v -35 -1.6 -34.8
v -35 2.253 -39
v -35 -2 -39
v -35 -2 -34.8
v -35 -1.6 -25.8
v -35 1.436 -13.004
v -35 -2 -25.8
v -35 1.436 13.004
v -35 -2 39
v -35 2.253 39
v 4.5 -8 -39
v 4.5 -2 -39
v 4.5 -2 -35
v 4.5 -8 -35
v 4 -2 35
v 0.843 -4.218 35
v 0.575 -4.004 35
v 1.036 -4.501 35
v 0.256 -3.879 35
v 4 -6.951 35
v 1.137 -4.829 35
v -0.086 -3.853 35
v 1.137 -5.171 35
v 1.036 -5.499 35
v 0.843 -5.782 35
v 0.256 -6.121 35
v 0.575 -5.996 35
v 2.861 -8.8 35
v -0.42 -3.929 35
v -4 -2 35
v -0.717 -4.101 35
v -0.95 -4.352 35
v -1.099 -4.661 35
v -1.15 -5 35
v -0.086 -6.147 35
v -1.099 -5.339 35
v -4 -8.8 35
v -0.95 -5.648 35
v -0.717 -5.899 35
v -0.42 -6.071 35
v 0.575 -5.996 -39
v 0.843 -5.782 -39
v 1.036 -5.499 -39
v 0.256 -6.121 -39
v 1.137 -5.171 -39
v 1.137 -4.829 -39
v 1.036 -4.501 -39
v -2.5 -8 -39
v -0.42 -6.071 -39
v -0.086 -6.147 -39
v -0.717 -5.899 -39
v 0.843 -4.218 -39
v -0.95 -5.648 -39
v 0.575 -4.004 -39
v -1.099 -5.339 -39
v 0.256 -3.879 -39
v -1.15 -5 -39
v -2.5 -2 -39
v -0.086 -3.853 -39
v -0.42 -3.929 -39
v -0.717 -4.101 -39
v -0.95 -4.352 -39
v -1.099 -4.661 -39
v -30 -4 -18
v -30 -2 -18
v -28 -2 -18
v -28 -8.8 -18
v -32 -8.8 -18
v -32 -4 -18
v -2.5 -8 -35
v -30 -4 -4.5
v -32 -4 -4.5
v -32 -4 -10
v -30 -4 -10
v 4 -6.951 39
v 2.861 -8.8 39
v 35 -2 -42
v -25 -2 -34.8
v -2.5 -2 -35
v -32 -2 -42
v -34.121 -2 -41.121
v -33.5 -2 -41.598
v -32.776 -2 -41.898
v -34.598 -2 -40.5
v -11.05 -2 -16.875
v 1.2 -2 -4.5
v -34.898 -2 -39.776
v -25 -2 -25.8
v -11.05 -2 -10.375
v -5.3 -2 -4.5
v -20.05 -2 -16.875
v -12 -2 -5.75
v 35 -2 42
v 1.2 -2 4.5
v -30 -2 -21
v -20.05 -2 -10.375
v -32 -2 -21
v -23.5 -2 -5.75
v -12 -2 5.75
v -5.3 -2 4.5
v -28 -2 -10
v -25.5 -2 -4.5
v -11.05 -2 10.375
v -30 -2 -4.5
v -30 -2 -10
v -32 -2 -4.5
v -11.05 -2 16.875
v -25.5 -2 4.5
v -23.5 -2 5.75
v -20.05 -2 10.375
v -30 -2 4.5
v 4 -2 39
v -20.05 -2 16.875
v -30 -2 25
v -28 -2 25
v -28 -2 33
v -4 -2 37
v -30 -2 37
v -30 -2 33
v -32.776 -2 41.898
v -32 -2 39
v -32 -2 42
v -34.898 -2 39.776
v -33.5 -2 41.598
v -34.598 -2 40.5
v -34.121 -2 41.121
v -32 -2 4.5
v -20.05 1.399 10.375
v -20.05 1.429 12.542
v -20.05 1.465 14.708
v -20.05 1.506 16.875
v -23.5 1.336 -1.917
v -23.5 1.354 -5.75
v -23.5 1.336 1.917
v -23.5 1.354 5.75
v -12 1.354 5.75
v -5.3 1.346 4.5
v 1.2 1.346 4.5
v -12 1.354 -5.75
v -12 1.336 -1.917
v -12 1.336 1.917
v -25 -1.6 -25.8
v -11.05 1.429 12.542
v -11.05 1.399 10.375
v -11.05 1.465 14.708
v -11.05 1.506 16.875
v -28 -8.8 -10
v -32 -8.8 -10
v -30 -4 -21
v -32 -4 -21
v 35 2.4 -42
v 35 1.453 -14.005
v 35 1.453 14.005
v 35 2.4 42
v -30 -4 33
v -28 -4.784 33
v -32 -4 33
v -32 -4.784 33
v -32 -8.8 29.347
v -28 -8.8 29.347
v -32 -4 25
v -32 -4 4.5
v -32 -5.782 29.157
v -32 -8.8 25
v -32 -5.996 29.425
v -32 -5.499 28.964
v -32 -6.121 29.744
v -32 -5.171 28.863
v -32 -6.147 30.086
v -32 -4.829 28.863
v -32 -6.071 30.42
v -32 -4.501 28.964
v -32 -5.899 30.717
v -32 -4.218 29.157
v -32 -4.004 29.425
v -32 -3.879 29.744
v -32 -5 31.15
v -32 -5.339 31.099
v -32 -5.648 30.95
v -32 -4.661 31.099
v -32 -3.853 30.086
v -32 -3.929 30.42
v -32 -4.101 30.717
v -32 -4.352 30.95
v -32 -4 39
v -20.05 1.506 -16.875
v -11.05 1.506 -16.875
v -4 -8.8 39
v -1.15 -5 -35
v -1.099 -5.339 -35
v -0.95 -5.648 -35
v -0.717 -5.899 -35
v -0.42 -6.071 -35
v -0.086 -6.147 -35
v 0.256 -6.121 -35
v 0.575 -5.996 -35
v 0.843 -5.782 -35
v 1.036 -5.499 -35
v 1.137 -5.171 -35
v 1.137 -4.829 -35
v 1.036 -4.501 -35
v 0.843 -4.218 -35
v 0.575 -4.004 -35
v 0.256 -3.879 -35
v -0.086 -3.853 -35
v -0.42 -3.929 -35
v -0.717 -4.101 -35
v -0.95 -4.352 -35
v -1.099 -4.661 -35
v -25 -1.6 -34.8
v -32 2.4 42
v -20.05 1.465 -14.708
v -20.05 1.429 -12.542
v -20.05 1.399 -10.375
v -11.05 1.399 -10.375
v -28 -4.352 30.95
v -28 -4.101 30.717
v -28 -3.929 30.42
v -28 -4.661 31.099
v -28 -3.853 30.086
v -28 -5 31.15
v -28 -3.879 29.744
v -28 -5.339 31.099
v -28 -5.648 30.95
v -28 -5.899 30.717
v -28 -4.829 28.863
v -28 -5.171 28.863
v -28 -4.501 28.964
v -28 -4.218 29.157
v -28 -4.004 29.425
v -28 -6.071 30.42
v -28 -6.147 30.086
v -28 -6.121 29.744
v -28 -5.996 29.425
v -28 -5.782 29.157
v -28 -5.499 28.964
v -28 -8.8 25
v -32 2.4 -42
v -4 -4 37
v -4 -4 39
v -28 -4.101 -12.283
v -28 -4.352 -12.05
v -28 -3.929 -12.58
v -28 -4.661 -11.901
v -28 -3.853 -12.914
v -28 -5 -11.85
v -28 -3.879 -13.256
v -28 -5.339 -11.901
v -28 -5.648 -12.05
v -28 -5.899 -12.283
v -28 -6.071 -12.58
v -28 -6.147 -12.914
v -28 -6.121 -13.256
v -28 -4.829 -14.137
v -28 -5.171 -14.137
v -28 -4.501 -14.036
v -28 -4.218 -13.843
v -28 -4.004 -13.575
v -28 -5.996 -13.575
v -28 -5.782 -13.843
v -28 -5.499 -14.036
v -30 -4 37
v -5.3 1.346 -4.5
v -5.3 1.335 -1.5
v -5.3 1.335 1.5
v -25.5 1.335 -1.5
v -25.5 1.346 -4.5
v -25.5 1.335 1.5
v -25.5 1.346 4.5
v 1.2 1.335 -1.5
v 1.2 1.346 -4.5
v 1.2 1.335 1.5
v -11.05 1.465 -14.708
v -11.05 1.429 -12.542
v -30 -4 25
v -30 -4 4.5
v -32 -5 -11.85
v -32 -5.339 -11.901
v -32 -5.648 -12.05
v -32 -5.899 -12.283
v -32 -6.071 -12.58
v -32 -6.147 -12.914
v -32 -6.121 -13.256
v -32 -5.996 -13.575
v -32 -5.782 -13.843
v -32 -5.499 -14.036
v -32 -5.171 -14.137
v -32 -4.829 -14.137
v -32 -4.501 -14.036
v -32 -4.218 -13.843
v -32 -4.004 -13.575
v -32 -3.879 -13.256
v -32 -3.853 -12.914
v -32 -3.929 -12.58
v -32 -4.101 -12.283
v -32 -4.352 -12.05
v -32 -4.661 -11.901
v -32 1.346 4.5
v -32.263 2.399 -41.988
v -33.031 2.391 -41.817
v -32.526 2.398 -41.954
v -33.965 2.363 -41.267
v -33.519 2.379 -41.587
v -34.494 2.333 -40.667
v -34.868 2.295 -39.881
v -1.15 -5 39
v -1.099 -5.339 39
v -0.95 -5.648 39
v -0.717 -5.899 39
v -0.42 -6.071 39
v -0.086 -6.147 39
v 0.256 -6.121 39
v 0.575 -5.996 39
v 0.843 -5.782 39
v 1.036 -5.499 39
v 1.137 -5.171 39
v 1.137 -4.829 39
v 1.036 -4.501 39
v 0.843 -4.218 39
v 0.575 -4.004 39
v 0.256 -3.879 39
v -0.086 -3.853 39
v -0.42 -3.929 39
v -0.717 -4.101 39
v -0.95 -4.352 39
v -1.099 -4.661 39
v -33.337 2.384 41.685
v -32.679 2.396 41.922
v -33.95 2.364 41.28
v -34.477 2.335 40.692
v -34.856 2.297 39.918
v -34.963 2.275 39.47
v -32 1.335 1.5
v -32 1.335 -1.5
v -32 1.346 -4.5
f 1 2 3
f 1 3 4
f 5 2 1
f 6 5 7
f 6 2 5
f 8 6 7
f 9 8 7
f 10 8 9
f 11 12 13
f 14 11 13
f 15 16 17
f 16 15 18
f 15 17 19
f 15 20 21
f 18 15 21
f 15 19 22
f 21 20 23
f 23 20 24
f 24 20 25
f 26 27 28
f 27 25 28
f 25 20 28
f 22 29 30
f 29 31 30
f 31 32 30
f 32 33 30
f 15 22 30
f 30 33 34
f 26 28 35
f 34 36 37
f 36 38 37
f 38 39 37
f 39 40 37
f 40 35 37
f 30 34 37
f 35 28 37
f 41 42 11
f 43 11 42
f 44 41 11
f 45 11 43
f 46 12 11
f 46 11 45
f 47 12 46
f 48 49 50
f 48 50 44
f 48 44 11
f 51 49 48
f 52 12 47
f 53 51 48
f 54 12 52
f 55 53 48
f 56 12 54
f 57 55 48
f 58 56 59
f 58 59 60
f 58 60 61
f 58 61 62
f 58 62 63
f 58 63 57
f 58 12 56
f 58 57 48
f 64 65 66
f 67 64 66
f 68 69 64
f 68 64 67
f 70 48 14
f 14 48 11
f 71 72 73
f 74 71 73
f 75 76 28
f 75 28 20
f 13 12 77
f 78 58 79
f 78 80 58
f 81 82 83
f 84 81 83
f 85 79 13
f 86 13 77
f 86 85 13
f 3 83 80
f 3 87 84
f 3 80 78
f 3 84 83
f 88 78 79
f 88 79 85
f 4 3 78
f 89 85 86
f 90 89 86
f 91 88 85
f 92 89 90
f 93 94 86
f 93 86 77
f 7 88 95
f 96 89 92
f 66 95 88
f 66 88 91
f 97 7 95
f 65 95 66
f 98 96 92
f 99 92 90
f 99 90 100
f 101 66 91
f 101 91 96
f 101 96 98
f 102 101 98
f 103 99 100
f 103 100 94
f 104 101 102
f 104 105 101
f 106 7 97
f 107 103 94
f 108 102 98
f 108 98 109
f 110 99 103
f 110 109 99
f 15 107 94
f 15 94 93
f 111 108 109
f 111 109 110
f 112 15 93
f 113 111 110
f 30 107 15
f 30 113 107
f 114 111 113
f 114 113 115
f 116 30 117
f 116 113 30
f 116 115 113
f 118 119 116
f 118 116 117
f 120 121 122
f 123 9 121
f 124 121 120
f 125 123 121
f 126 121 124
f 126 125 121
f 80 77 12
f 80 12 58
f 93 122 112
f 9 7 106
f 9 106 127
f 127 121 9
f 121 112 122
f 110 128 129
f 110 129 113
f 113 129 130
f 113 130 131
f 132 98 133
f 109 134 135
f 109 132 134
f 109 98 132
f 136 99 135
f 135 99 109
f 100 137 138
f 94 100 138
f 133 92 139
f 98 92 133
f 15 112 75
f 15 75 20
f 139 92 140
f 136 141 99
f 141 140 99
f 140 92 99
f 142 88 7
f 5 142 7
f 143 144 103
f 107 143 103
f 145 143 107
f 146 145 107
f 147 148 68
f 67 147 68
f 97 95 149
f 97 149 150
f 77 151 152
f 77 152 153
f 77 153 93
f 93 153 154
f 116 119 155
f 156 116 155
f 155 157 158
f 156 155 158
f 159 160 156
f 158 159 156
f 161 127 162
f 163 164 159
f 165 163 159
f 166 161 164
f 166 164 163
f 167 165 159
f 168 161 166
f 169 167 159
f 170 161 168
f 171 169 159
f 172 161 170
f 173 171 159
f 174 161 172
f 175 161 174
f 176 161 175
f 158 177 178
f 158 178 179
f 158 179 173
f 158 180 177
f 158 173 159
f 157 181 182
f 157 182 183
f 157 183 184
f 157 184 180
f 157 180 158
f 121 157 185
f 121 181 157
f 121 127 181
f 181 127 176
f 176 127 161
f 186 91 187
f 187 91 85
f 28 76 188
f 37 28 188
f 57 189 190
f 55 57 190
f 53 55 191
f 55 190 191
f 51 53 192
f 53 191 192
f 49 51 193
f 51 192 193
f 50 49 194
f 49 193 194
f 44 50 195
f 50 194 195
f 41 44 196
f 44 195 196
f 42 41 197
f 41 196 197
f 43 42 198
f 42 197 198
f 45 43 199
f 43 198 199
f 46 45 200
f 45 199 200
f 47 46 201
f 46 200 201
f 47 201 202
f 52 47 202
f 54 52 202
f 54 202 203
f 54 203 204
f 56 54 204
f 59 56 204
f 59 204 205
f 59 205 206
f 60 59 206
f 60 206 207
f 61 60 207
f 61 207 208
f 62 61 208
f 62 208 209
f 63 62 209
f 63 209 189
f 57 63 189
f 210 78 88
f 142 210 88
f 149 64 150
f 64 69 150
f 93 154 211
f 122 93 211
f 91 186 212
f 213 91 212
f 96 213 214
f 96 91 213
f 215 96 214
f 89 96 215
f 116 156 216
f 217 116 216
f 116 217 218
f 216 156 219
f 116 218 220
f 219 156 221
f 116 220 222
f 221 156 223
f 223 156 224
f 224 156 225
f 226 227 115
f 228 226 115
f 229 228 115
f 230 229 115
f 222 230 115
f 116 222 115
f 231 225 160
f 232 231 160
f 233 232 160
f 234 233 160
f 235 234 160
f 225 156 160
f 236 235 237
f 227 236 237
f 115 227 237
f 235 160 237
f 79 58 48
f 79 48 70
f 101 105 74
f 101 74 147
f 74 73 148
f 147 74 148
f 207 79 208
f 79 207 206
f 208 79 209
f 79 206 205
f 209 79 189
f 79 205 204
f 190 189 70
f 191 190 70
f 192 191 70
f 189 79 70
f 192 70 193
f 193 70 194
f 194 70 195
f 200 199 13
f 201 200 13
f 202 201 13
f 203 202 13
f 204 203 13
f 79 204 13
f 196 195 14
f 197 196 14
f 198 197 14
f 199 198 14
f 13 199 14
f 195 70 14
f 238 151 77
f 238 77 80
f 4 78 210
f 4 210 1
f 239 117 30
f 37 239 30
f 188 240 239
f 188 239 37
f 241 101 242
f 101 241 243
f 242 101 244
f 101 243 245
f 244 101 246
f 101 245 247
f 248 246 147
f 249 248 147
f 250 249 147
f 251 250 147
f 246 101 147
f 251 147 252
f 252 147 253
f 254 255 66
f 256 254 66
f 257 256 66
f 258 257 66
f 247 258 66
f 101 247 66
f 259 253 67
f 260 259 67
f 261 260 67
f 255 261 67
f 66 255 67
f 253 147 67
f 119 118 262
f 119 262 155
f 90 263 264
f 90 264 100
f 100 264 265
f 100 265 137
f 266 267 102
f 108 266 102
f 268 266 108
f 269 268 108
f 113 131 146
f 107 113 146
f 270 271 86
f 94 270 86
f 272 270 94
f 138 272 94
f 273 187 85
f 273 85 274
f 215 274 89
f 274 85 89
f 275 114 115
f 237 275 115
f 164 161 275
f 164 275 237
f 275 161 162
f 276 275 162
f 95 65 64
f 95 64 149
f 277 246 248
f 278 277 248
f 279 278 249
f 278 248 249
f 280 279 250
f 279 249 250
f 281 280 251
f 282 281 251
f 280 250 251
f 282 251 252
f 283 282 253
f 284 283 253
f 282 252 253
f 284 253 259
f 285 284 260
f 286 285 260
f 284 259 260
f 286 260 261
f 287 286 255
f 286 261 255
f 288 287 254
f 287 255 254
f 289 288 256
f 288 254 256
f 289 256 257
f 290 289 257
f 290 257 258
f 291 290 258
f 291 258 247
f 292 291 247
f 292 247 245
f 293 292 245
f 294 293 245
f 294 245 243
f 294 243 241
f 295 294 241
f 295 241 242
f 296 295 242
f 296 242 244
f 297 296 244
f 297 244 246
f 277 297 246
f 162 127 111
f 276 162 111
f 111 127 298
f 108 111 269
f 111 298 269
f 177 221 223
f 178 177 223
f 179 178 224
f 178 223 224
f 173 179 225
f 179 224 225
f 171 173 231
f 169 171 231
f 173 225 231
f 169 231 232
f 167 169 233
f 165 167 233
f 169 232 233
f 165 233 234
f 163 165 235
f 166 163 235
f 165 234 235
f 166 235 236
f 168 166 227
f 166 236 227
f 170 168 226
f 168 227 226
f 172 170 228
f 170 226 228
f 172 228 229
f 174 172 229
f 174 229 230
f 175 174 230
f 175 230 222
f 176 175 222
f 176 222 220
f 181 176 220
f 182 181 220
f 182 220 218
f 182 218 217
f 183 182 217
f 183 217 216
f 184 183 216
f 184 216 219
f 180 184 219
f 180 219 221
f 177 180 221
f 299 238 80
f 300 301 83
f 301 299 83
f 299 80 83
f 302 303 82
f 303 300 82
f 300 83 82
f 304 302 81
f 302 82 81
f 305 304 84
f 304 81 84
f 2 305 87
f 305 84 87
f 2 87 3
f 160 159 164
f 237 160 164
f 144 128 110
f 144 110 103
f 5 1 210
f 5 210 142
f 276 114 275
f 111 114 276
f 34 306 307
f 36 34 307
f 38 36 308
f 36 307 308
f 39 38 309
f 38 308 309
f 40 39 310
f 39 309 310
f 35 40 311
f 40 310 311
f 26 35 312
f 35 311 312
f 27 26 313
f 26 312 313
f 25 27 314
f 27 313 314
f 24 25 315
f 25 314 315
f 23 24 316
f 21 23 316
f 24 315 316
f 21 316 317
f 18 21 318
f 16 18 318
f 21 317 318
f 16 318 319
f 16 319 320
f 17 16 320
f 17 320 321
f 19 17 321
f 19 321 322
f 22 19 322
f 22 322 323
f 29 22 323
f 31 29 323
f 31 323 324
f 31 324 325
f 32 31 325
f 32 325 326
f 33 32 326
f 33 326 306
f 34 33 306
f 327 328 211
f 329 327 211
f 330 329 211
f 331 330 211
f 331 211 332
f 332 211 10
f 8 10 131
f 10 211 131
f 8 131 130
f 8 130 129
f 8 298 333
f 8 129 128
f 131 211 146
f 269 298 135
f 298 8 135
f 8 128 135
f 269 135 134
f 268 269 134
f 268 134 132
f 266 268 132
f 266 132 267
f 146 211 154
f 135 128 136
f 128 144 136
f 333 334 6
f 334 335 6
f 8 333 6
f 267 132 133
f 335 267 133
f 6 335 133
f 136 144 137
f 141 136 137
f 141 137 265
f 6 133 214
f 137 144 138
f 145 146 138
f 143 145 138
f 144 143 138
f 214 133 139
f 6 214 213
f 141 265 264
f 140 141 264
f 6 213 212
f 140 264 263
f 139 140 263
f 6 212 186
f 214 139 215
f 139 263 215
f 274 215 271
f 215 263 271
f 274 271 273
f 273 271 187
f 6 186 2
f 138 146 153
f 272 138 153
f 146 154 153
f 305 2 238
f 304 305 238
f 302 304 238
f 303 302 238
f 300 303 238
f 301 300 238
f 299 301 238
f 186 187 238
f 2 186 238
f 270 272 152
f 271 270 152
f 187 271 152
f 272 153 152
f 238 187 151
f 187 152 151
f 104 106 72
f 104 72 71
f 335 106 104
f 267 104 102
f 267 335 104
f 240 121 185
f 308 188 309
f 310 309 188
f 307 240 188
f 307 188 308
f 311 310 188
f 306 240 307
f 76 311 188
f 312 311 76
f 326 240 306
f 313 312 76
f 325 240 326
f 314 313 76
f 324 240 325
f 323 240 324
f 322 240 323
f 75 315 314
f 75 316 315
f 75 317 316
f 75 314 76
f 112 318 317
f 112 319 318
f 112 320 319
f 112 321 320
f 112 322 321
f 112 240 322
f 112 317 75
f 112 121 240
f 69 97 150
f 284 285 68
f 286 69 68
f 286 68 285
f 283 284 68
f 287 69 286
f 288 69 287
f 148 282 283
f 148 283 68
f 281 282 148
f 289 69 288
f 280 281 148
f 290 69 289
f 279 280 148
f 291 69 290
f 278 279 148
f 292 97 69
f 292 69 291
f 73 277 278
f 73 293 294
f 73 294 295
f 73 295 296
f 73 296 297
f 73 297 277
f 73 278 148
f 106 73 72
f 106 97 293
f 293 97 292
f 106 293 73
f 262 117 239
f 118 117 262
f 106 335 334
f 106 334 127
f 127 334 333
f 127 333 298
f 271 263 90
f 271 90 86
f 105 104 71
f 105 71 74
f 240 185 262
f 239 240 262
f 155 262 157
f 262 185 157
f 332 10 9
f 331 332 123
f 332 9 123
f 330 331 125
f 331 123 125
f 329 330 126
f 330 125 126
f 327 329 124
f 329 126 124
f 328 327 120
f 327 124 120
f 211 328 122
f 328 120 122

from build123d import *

# Parameters (mm, degrees)
SKETCH009_W             = 84
SKETCH009_H             = 70
PAD002_DEPTH            = 2
SKETCH010_W             = 2
SKETCH010_H             = 7
PAD003_DEPTH            = 2
SKETCH012_W             = 8
SKETCH012_H             = 6.8
PAD004_DEPTH            = 4
SKETCH013_W             = 7
SKETCH013_H             = 6
PAD005_DEPTH            = 4
SKETCH011_W             = 8
SKETCH011_H             = 6.8
PAD006_DEPTH            = 4
SKETCH014_R             = 1.15
POCKET002_DEPTH         = 81.001
SKETCH016_R             = 1.15
POCKET003_DEPTH         = 8.501
SKETCH018_W             = 11.5
SKETCH018_H             = 11.5
POCKET004_DEPTH         = 5
POCKET005_DEPTH         = 5
POCKET006_DEPTH         = 5
SKETCH022_W             = 9
SKETCH022_H             = 10
POCKET007_DEPTH         = 0.4
FILLET_R                = 3
BODY002_PITCH_ANGLE     = -90
BODY002_PLACEMENT_ANGLE = 90
PAD001_DEPTH            = 35
SKETCH007_W             = 11.5
SKETCH007_H             = 11.5
POCKET001_DEPTH         = 13
FILLET001_R             = 3
SKETCH025_W             = 6.5
SKETCH025_H             = 9
SKETCH025_W_2           = 9
SKETCH025_H_2           = 6.5
POCKET008_DEPTH         = 8


with BuildPart() as back:
    # Sketch009 → Pad002 (new body)
    with BuildSketch(Plane.XY):
        Rectangle(SKETCH009_W, SKETCH009_H)
    extrude(amount=PAD002_DEPTH)

    # Sketch010 (on Face6 of Pad002) → Pad003 (join)
    with BuildSketch(Plane.XY.offset(2)):
        with Locations((-38, -1)):
            Rectangle(SKETCH010_W, SKETCH010_H)
        Polygon((-21, 32), (39, 32), (39, -4), (37, -4), (37, 30), (-21, 30), align=None)
    extrude(amount=PAD003_DEPTH)

    # Sketch012 (on Face15 of Pad003) → Pad004 (join)
    with BuildSketch(Plane.YZ.offset(39)):
        with Locations((0, 5.4)):
            Rectangle(SKETCH012_W, SKETCH012_H)
    extrude(amount=-PAD004_DEPTH)

    # Sketch013 (on Face9 of Pad004) → Pad005 (join)
    with BuildSketch(Plane(origin=(-39, 0, 0), x_dir=(0, -1, 0), z_dir=(-1, 0, 0))):
        with Locations((1, 5)):
            Rectangle(SKETCH013_W, SKETCH013_H)
    extrude(amount=-PAD005_DEPTH)

    # Sketch011 (on Face16 of Pad003) → Pad006 (join)
    with BuildSketch(Plane(origin=(0, 32, 0), x_dir=(-1, 0, 0), z_dir=(0, 1, 0))):
        with Locations((-29, 5.4)):
            Rectangle(SKETCH011_W, SKETCH011_H)
        with Locations((14, 5.4)):
            Rectangle(SKETCH011_W, SKETCH011_H)
    extrude(amount=-PAD006_DEPTH)

    # Sketch014 (on Face44 of Pad006) → Pocket002 (cut, through all)
    with BuildSketch(Plane.YZ.offset(39)):
        with Locations((0, 5)):
            Circle(SKETCH014_R)
    extrude(amount=-POCKET002_DEPTH, mode=Mode.SUBTRACT)

    # Sketch016 → Pocket003 (cut, through all)
    with BuildSketch(Plane.XZ.offset(-26.5)):
        with Locations((-13, 5)):
            Circle(SKETCH016_R)
        with Locations((30, 5)):
            Circle(SKETCH016_R)
    extrude(amount=-POCKET003_DEPTH, mode=Mode.SUBTRACT)

    # Sketch018 (on Face5 of Pocket003) → Pocket004 (cut)
    with BuildSketch(Plane.XY.offset(2)):
        with Locations((0, 17.75)):
            Rectangle(SKETCH018_W, SKETCH018_H)
    extrude(amount=-POCKET004_DEPTH, mode=Mode.SUBTRACT)

    # Sketch019 (on Face31 of Pocket004) → Pocket005 (cut)
    with BuildSketch(Plane.XZ.offset(-28)):
        Polygon((29.125944, 9.042901), (33.258869, 4.499726), (33.258869, 9.042901), align=None)
    extrude(amount=-POCKET005_DEPTH, mode=Mode.SUBTRACT)

    # Sketch020 (on Face36 of Pocket005) → Pocket006 (cut)
    with BuildSketch(Plane(origin=(35, 0, 0), x_dir=(0, -1, 0), z_dir=(-1, 0, 0))):
        Polygon((2.77547, 8.938441), (6.386171, 3.079567), (6.386171, 8.938441), align=None)
    extrude(amount=-POCKET006_DEPTH, mode=Mode.SUBTRACT)

    # Sketch022 (on Face5 of Pocket005) → Pocket007 (cut)
    with BuildSketch(Plane.XY.offset(2)):
        with Locations((-30.3, 30)):
            Rectangle(SKETCH022_W, SKETCH022_H)
    extrude(amount=-POCKET007_DEPTH, mode=Mode.SUBTRACT)

    # Fillet
    fillet_edges = [back.edges().sort_by_distance(p)[0] for p in [
        (42, 35, 1),
        (-42, 35, 1),
    ]]
    fillet(fillet_edges, radius=FILLET_R)


with BuildPart() as back_1:
    # Body002 pitch: moved
    add(back.part.rotate(Axis((0, 0, 0), (0, 1, 0)), BODY002_PITCH_ANGLE))


with BuildPart() as back_2:
    # Body002 placement: moved
    add(back_1.part.rotate(Axis((0, 0, 0), (0, 0, 1)), BODY002_PLACEMENT_ANGLE))


with BuildPart() as curve:
    # Sketch006 → Pad001 (new body, symmetric)
    with BuildSketch(Plane(origin=(0, 0, 0), x_dir=(0, 0, -1), z_dir=(1, 0, 0))):
        with BuildLine():
            ThreePointArc((-42, 2.4), (0, 1.334097), (42, 2.4))
            Line((42, -0.1), (42, 2.4))
            Line((-42, -0.1), (42, -0.1))
            Line((-42, 2.4), (-42, -0.1))
        make_face()
    extrude(amount=PAD001_DEPTH, both=True)

    # Sketch007 (on Face3 of Pad001) → Pocket001 (cut)
    with BuildSketch(Plane.XZ.offset(0.1)):
        with Locations((-17.75, 0)):
            Rectangle(SKETCH007_W, SKETCH007_H)
    extrude(amount=-POCKET001_DEPTH, mode=Mode.SUBTRACT)

    # Fillet001
    fillet001_edges = [curve.edges().sort_by_distance(p)[0] for p in [
        (-35, 1.15, -42),
        (-35, 1.15, 42),
    ]]
    fillet(fillet001_edges, radius=FILLET001_R)

    # Boolean: union Back
    add(back_2.part)

    # Sketch025 (on Face32 of Boolean) → Pocket008 (cut, symmetric)
    with BuildSketch(Plane.XZ.offset(2)):
        with Locations((-28.75, 0)):
            Rectangle(SKETCH025_W, SKETCH025_H)
        with Locations((-15.55, 13.625)):
            Rectangle(SKETCH025_W_2, SKETCH025_H_2)
        with Locations((-2.05, 0)):
            Rectangle(SKETCH025_W, SKETCH025_H)
        with Locations((-15.55, -13.625)):
            Rectangle(SKETCH025_W_2, SKETCH025_H_2)
    extrude(amount=POCKET008_DEPTH, both=True, mode=Mode.SUBTRACT)


solid = curve.part
